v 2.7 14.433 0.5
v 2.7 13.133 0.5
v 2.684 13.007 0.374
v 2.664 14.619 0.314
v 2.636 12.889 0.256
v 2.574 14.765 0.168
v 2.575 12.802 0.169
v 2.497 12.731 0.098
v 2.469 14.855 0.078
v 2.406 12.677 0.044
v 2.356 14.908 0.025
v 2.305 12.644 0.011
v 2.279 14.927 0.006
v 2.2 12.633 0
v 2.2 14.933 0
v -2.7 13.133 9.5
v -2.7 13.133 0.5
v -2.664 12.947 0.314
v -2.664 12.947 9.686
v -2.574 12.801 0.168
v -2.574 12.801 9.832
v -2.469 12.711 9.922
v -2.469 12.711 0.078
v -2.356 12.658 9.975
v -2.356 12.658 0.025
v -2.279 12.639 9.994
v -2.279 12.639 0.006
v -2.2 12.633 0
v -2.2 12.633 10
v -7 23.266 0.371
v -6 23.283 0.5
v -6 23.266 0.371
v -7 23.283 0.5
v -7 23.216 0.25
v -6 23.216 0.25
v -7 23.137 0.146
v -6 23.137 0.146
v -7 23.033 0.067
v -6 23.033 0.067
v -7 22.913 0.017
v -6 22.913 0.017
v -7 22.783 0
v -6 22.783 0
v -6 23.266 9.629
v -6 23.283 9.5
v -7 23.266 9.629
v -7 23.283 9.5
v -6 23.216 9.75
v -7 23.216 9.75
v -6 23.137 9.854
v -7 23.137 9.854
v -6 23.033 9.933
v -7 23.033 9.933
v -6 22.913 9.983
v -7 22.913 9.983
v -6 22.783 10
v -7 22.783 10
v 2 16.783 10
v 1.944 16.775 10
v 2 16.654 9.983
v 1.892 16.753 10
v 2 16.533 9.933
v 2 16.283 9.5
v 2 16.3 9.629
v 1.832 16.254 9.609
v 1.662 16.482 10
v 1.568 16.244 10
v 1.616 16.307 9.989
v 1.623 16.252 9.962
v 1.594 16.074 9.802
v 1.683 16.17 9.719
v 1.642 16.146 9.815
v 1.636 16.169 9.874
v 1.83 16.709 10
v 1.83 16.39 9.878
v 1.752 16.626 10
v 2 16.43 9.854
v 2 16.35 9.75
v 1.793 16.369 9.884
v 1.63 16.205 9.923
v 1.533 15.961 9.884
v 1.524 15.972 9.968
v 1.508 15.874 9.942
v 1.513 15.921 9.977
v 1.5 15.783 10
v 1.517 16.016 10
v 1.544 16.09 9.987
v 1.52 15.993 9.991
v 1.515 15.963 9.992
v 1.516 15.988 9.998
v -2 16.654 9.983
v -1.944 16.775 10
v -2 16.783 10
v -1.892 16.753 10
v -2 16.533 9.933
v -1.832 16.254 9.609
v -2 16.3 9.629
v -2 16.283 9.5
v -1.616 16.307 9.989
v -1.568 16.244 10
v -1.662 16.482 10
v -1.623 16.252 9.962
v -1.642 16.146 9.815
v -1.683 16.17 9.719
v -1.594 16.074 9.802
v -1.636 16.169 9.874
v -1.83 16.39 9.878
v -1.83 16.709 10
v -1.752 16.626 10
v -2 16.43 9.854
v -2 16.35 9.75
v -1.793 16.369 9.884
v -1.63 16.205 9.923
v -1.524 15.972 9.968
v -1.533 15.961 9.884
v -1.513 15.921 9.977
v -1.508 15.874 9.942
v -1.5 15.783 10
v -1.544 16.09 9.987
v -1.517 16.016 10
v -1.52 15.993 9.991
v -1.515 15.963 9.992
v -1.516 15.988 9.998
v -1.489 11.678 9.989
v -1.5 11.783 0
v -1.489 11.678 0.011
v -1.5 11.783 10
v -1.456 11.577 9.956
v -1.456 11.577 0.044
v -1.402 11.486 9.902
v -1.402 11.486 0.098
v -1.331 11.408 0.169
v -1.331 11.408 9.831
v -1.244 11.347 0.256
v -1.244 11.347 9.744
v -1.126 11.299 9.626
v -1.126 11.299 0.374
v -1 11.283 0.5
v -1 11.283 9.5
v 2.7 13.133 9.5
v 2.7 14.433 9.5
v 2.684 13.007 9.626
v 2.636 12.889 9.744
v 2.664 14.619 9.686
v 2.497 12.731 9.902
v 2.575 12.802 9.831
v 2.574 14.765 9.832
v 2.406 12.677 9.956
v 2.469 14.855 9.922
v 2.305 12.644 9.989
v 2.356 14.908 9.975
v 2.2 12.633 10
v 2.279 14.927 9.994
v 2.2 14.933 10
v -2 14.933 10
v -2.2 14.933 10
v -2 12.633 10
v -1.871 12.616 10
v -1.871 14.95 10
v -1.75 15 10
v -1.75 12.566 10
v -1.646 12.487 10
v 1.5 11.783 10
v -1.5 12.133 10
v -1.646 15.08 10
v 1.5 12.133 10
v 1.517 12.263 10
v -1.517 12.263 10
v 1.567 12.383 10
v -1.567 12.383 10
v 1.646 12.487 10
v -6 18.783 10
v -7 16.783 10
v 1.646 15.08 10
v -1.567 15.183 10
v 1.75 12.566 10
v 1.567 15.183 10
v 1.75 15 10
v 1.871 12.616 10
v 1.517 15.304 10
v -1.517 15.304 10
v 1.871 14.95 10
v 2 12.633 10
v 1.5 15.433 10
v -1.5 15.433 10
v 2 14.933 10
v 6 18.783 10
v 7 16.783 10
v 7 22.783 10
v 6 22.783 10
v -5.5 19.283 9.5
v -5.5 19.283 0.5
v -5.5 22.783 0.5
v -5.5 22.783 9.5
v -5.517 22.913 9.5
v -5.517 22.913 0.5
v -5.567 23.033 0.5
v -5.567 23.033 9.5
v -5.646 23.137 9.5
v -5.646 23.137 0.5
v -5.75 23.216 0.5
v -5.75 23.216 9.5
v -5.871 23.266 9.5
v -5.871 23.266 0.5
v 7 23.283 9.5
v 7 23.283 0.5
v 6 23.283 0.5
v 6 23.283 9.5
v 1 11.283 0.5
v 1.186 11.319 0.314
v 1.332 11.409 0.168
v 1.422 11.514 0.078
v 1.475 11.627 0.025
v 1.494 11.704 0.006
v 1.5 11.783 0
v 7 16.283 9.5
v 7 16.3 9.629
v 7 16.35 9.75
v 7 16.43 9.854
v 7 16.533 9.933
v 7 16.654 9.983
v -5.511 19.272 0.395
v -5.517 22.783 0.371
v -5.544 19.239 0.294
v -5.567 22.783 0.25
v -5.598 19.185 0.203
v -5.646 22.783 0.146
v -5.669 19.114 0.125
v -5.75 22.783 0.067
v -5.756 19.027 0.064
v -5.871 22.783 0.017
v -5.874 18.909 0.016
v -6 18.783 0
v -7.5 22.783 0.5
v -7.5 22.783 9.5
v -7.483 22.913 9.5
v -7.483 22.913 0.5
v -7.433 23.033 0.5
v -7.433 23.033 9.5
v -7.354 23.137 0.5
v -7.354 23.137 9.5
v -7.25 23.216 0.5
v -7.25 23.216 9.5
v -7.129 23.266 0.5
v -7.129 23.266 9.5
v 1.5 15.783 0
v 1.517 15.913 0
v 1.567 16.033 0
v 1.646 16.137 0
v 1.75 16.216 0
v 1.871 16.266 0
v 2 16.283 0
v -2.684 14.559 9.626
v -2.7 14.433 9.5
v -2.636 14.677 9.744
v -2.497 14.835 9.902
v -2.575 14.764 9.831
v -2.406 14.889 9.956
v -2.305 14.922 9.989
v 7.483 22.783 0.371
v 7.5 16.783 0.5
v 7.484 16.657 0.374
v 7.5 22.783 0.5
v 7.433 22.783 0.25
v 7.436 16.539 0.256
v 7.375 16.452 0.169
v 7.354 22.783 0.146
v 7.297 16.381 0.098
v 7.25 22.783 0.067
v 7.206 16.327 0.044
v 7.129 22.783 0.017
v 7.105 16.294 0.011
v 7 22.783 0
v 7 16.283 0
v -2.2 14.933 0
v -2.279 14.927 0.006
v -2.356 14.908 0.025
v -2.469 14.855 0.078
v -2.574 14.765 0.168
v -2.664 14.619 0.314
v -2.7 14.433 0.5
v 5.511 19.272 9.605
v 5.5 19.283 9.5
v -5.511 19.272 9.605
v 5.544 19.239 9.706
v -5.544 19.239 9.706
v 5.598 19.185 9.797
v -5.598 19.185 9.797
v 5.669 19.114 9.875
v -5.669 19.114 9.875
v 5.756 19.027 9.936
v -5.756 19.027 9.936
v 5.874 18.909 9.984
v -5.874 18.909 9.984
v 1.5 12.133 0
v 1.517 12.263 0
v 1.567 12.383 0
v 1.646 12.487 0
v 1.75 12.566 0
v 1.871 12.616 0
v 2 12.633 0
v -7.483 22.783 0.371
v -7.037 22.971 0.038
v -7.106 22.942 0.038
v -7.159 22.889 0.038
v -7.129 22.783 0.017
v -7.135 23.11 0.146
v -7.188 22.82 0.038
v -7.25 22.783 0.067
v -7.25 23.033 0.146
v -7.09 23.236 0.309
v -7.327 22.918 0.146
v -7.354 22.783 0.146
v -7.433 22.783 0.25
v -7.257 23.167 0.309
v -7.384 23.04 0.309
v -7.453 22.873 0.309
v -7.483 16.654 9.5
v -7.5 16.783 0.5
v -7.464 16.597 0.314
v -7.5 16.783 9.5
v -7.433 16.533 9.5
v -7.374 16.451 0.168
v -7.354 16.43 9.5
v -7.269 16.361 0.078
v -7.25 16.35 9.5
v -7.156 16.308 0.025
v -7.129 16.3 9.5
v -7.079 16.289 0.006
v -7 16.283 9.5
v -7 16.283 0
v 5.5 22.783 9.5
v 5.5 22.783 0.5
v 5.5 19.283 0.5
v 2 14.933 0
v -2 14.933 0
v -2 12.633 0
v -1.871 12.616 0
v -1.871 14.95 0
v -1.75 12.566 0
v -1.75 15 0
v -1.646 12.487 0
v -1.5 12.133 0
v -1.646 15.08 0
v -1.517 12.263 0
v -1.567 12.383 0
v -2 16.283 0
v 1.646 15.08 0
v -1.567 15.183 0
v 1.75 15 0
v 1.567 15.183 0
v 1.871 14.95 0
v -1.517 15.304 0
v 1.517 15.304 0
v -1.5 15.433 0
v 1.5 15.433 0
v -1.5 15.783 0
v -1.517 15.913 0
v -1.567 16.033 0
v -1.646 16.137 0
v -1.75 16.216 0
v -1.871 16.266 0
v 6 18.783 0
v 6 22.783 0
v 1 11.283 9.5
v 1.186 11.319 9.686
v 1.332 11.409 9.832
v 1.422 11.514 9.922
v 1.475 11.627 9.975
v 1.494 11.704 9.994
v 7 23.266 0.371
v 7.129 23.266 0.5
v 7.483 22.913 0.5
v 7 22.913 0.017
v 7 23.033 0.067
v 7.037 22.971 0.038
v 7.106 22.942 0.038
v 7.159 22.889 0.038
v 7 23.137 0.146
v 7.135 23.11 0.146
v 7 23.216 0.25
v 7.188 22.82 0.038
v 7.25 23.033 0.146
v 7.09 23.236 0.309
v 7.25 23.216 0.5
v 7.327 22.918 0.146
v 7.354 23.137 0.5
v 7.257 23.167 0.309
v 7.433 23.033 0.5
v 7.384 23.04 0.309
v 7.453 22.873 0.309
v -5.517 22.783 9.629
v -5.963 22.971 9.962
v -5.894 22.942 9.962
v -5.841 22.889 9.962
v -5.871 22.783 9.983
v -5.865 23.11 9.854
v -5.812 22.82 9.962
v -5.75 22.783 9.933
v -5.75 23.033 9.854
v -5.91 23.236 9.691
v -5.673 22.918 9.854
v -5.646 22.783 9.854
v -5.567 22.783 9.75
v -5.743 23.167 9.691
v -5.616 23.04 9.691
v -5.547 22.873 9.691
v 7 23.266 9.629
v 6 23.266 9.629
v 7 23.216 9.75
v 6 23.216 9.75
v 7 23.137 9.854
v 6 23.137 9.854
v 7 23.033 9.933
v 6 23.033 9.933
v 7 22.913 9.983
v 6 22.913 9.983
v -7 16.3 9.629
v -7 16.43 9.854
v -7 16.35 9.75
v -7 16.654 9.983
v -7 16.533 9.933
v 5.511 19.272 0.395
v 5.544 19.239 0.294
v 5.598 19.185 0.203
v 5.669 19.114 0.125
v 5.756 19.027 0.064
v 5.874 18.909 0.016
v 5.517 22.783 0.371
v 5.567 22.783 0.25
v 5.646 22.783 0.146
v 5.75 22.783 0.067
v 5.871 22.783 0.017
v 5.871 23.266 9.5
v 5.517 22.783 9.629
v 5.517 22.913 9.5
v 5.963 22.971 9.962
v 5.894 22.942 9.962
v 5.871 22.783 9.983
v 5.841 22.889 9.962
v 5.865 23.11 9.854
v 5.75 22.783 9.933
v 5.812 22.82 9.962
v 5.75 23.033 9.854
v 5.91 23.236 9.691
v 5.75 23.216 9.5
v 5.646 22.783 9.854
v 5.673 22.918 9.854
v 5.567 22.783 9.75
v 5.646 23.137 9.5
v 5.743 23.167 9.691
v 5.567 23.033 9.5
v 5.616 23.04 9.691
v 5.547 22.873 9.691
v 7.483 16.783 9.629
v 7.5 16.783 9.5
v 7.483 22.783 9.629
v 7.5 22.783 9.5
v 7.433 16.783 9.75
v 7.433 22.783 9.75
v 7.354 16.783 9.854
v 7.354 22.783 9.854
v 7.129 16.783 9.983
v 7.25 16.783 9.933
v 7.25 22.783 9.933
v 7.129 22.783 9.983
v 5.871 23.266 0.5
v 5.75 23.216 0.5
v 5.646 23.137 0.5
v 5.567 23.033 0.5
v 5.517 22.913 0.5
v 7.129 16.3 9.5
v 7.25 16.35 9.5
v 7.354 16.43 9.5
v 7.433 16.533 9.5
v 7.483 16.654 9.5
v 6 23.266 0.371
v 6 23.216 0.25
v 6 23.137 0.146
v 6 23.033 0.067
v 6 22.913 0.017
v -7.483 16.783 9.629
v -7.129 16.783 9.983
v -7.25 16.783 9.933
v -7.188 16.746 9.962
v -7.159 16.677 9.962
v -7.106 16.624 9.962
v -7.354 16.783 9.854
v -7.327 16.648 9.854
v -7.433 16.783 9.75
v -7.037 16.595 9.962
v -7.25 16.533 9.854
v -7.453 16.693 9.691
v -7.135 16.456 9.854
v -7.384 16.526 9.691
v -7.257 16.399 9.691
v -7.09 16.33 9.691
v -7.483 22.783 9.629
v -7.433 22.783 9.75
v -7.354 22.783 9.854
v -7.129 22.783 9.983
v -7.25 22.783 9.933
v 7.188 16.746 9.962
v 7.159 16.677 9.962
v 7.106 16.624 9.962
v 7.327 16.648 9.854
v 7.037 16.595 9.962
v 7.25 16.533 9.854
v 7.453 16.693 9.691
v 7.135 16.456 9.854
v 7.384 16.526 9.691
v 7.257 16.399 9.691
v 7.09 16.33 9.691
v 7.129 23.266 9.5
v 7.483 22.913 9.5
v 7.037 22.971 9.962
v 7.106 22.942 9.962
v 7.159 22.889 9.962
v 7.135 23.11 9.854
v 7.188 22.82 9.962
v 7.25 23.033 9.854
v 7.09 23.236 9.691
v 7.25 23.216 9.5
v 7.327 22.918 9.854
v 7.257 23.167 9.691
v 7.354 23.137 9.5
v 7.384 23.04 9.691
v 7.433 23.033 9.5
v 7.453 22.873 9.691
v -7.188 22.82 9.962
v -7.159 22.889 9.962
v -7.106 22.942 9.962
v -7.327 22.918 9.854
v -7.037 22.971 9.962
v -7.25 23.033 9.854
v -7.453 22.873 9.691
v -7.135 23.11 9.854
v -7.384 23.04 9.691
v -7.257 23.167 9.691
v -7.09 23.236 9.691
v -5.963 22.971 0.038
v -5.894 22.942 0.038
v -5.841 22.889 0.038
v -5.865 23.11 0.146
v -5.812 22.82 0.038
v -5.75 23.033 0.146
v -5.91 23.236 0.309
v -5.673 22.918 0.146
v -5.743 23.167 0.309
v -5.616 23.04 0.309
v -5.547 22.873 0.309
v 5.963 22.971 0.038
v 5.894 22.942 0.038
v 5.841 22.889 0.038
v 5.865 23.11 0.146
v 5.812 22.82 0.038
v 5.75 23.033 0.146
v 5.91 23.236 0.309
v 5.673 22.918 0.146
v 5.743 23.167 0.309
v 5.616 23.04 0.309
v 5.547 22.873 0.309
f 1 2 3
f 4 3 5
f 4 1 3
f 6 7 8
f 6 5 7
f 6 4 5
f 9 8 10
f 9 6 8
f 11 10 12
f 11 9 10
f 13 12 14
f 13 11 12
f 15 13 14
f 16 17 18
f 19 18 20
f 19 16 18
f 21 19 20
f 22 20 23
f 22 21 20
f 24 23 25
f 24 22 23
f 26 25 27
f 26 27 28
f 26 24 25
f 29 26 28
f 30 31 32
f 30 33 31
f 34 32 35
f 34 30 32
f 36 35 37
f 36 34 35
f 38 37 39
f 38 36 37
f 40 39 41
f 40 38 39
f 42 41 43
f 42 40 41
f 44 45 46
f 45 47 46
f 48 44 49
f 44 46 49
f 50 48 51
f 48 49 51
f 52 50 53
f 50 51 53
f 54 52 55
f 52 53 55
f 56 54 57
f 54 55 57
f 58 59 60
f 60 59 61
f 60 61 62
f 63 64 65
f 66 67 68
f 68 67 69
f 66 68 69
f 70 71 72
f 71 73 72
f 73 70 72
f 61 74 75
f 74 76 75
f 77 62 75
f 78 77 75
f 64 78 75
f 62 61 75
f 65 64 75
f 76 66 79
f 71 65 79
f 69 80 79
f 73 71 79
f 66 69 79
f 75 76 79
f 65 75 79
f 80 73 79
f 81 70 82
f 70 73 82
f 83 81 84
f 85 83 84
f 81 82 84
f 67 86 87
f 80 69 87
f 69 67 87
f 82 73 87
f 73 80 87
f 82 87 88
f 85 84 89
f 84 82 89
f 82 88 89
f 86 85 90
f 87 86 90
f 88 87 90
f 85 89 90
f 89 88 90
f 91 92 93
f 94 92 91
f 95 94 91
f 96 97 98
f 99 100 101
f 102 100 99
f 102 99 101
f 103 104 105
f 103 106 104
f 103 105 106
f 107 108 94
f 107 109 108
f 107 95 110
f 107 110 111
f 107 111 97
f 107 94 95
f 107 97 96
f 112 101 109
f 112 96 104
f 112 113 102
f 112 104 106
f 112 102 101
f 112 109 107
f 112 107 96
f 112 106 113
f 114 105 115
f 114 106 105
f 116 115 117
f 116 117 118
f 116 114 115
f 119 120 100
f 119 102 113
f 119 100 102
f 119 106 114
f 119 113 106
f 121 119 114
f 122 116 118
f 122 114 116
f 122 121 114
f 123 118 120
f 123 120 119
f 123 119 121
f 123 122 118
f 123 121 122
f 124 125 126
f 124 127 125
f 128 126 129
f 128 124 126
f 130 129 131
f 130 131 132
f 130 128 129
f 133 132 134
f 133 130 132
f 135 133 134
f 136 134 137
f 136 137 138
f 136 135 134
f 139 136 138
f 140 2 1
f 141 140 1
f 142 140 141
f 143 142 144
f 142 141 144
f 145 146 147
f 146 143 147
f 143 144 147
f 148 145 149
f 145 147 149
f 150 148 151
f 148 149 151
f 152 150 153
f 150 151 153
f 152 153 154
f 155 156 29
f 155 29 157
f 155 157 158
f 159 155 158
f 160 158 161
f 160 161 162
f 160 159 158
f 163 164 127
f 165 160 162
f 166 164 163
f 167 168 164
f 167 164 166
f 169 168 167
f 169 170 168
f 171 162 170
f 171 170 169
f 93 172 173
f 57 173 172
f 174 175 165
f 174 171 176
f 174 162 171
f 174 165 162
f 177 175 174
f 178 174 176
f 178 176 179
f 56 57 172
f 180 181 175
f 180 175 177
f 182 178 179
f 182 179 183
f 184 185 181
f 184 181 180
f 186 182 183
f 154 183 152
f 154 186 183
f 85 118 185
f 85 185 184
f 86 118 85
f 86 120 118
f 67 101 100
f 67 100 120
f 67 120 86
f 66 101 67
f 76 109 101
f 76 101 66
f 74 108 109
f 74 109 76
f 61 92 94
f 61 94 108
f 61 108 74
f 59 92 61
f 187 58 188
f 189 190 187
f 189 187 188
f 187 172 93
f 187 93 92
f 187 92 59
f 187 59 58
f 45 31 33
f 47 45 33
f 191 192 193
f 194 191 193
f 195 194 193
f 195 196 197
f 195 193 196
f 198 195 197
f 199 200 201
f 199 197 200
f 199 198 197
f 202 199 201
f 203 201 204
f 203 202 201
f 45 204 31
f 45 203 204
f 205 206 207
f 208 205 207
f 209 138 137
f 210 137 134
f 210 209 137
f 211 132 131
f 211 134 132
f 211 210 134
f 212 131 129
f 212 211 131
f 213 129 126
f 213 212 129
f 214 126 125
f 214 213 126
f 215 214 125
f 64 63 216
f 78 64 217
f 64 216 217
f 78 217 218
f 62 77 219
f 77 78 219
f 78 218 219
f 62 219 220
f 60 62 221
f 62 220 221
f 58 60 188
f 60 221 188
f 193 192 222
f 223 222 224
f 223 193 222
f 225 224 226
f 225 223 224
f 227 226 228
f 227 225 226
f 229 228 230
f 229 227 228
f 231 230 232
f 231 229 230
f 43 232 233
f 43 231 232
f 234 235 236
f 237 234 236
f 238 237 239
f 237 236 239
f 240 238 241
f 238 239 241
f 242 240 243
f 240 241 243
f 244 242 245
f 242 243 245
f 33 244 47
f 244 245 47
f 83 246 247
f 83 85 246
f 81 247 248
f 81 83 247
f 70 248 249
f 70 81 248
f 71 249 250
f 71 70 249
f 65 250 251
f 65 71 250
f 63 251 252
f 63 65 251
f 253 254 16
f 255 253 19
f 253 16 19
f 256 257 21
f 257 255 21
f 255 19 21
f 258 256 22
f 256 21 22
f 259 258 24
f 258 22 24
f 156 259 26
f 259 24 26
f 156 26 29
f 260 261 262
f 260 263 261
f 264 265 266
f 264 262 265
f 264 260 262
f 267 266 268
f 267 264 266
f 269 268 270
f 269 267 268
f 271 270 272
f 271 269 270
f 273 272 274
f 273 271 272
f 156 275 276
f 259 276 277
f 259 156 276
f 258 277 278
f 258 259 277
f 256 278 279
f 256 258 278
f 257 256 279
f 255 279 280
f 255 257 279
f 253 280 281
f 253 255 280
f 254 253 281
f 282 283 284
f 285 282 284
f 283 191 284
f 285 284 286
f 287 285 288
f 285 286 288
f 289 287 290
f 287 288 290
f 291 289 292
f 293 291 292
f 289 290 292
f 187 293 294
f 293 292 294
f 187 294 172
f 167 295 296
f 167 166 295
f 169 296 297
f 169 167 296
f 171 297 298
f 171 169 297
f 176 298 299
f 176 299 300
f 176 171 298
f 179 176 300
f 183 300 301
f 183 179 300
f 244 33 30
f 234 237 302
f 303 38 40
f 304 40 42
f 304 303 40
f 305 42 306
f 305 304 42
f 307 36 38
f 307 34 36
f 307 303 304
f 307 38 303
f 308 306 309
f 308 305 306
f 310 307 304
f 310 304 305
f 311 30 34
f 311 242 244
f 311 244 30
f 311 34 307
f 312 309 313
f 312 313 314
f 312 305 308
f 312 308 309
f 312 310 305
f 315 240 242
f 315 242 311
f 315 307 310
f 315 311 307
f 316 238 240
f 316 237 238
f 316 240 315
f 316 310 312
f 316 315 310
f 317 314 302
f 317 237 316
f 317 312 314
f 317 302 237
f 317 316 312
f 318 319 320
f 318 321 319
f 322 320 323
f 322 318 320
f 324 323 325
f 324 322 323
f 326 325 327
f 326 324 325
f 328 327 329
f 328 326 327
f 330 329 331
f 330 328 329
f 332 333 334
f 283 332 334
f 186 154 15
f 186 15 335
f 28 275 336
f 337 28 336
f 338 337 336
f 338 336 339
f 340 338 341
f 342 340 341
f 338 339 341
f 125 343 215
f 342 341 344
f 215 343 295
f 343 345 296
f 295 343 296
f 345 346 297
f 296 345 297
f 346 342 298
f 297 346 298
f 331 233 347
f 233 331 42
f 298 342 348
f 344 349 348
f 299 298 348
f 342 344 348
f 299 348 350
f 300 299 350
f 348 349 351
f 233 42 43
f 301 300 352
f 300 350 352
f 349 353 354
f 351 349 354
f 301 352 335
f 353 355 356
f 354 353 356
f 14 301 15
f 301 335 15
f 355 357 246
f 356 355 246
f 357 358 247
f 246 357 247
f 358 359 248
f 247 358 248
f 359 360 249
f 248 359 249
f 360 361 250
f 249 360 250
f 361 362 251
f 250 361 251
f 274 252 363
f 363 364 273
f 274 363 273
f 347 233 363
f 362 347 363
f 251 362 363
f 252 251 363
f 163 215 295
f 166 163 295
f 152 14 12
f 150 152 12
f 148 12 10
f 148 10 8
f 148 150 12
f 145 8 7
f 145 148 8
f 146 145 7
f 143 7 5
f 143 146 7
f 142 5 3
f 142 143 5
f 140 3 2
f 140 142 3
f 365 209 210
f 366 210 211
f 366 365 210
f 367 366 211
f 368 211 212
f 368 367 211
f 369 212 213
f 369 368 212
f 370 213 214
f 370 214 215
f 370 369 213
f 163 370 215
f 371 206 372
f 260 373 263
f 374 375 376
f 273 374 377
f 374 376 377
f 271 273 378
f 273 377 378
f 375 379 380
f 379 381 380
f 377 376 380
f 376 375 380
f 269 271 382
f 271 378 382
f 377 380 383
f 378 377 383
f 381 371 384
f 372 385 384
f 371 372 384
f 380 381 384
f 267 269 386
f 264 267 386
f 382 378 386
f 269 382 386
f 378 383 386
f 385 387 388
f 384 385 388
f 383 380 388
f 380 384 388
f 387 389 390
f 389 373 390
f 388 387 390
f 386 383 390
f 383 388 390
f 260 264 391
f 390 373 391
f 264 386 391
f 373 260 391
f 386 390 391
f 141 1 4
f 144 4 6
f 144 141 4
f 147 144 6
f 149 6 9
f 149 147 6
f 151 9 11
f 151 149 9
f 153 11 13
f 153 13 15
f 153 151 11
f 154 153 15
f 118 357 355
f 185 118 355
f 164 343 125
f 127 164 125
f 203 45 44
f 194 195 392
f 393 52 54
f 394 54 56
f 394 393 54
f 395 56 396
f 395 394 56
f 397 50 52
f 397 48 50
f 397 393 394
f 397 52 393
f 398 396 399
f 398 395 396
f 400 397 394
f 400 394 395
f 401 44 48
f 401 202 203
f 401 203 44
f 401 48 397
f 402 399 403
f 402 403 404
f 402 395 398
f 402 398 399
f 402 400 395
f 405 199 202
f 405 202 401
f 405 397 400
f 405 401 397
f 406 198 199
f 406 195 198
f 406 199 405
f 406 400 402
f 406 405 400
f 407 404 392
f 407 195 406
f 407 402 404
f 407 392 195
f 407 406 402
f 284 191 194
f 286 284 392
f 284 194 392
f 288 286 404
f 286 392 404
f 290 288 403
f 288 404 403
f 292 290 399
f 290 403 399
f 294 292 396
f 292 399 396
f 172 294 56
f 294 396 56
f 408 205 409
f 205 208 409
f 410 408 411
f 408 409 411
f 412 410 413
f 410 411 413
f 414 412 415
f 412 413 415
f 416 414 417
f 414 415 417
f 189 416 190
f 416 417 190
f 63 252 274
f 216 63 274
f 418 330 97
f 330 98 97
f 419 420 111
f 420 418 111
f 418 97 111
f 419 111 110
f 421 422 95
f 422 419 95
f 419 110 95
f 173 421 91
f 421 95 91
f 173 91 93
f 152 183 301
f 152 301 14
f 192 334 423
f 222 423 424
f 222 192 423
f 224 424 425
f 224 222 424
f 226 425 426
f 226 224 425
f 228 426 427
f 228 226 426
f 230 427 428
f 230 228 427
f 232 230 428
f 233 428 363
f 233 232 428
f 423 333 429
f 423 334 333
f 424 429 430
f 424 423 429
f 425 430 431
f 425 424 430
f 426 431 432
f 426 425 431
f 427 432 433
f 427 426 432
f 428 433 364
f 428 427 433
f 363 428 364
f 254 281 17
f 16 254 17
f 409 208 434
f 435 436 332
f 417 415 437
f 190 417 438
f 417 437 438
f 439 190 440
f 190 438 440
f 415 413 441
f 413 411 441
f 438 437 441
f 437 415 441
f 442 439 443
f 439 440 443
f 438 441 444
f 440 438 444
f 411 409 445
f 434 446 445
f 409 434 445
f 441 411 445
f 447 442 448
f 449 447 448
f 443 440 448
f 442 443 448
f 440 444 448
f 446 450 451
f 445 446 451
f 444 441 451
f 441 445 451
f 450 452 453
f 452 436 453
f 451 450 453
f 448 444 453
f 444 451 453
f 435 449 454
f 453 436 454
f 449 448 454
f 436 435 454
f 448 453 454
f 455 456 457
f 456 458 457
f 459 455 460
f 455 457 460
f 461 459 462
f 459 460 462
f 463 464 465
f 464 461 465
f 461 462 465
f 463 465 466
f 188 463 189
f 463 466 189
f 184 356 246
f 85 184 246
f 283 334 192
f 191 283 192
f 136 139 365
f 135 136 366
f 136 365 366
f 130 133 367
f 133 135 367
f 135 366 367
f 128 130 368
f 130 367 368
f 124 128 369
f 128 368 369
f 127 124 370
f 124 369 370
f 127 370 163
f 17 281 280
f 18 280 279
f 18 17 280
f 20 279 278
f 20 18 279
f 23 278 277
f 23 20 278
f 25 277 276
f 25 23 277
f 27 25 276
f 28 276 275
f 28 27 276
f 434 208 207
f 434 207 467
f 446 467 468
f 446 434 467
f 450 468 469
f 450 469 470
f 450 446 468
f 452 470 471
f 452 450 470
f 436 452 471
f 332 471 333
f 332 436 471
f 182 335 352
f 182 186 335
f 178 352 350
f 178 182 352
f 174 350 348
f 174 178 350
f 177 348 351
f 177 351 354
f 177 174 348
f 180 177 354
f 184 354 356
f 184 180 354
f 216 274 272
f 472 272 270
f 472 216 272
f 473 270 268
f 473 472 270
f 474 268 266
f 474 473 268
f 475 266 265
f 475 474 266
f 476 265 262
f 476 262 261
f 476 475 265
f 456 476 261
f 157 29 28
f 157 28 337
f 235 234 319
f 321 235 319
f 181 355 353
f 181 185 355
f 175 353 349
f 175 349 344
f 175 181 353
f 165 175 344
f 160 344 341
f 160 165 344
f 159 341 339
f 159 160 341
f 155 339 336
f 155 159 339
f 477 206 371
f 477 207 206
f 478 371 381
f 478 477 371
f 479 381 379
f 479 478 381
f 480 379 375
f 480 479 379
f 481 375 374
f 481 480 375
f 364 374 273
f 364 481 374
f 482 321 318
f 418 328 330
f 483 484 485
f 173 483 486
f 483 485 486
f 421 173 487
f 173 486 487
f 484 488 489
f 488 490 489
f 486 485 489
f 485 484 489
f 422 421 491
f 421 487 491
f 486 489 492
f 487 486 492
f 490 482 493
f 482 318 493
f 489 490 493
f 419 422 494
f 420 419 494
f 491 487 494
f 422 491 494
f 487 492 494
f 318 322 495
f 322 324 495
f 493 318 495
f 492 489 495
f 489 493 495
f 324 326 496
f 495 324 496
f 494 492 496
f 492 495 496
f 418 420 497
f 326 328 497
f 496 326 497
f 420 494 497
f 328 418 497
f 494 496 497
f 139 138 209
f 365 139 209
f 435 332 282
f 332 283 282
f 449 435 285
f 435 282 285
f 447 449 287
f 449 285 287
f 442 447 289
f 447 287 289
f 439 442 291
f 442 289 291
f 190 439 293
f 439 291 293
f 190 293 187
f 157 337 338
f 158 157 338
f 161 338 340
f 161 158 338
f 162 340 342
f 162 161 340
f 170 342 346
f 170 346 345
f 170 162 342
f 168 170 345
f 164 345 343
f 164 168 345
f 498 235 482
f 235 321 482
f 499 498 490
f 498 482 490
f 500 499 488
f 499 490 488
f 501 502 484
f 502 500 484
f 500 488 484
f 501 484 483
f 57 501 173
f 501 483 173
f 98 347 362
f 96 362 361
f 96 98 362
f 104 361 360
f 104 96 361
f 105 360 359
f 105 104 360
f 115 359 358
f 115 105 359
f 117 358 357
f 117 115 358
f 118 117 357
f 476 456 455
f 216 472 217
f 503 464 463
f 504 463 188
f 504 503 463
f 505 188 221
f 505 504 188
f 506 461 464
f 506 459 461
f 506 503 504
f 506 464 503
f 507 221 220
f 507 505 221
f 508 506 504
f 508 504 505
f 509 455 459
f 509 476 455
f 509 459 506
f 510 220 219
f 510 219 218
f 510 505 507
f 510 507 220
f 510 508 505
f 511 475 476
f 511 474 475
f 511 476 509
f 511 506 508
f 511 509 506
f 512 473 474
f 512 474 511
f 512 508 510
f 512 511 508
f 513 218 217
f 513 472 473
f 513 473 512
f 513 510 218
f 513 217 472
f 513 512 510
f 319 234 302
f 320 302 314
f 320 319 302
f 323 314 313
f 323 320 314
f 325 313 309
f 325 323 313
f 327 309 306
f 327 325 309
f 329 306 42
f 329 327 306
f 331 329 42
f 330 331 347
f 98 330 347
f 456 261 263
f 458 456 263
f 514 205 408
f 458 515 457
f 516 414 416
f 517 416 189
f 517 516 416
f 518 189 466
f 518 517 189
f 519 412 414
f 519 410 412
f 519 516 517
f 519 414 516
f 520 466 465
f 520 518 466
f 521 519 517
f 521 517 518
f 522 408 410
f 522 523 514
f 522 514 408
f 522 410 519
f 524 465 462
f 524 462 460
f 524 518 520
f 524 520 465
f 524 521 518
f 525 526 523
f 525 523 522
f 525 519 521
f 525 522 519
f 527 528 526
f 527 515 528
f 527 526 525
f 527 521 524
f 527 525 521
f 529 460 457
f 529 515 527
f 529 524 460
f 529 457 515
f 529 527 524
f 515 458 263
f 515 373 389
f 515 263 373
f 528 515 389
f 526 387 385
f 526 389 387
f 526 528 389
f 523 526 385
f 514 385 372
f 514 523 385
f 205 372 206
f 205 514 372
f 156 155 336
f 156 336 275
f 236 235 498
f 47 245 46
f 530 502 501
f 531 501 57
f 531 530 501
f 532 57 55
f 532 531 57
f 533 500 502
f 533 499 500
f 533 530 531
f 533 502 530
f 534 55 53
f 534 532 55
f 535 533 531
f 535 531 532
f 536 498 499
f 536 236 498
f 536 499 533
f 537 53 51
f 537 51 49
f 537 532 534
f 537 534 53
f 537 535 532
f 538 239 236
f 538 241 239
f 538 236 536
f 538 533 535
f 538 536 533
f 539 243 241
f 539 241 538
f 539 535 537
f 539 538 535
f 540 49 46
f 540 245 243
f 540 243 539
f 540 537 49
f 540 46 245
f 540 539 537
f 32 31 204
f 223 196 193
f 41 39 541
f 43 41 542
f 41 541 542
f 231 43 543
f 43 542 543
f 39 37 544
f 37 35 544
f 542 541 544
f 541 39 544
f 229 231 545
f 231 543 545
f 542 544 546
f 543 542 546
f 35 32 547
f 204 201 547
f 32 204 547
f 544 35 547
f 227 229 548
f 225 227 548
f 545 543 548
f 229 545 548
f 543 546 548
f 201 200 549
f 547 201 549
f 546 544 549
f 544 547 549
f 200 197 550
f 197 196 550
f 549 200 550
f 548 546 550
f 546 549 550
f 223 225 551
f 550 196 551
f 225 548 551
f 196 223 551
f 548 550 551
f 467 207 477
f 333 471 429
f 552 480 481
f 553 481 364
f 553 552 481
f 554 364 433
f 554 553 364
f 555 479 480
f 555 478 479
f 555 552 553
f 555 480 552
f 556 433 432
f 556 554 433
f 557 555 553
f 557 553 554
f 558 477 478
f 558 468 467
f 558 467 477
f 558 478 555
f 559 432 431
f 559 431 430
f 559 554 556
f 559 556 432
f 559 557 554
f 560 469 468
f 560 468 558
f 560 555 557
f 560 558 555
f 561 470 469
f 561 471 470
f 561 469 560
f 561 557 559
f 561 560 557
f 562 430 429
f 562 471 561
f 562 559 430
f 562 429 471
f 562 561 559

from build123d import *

# Parameters (mm, degrees)
PAD_DEPTH = 10
FILLET_R  = 0.5


with BuildPart() as part:
    # Sketch → Pad (new body)
    with BuildSketch(Plane.XY):
        Polygon((-7.5, 23.28312), (-7.5, 16.28312), (-1.5, 16.28312), (-1.5, 14.93312), (-2.7, 14.93312), (-2.7, 12.63312), (-1.5, 12.63312), (-1.5, 11.28312), (1.5, 11.28312), (1.5, 12.63312), (2.7, 12.63312), (2.7, 14.93312), (1.5, 14.93312), (1.5, 16.28312), (7.5, 16.28312), (7.5, 23.28312), (5.5, 23.28312), (5.5, 19.28312), (-5.5, 19.28312), (-5.5, 23.28312), align=None)
    extrude(amount=PAD_DEPTH)

    # Fillet
    fillet_edges = [part.edges().sort_by_distance(p)[0] for p in [
        (2.7, 12.63312, 5),
        (2.7, 14.93312, 5),
        (2.7, 13.78312, 0),
        (2.7, 13.78312, 10),
        (1.5, 11.28312, 5),
        (-1.5, 11.28312, 5),
        (0, 11.28312, 0),
        (0, 11.28312, 10),
        (-2.7, 13.78312, 0),
        (1.5, 12.63312, 5),
        (1.5, 14.93312, 5),
        (-1.5, 12.63312, 5),
        (-1.5, 14.93312, 5),
        (-2.7, 14.93312, 5),
        (-2.7, 12.63312, 5),
        (1.5, 16.28312, 5),
        (7.5, 16.28312, 5),
        (-1.5, 16.28312, 5),
        (-7.5, 16.28312, 5),
        (-7.5, 23.28312, 5),
        (7.5, 23.28312, 5),
        (5.5, 23.28312, 5),
        (-5.5, 23.28312, 5),
        (6.5, 23.28312, 0),
        (7.5, 19.78312, 0),
        (-6.5, 23.28312, 0),
        (-7.5, 19.78312, 0),
        (-7.5, 19.78312, 10),
        (-6.5, 23.28312, 10),
        (6.5, 23.28312, 10),
        (7.5, 19.78312, 10),
        (-4.5, 16.28312, 10),
        (4.5, 16.28312, 10),
        (-2.7, 13.78312, 10),
        (0, 19.28312, 10),
        (0, 19.28312, 0),
        (-5.5, 21.28312, 0),
        (5.5, 21.28312, 0),
        (5.5, 21.28312, 10),
        (-5.5, 21.28312, 10),
    ]]
    fillet(fillet_edges, radius=FILLET_R)


solid = part.part
